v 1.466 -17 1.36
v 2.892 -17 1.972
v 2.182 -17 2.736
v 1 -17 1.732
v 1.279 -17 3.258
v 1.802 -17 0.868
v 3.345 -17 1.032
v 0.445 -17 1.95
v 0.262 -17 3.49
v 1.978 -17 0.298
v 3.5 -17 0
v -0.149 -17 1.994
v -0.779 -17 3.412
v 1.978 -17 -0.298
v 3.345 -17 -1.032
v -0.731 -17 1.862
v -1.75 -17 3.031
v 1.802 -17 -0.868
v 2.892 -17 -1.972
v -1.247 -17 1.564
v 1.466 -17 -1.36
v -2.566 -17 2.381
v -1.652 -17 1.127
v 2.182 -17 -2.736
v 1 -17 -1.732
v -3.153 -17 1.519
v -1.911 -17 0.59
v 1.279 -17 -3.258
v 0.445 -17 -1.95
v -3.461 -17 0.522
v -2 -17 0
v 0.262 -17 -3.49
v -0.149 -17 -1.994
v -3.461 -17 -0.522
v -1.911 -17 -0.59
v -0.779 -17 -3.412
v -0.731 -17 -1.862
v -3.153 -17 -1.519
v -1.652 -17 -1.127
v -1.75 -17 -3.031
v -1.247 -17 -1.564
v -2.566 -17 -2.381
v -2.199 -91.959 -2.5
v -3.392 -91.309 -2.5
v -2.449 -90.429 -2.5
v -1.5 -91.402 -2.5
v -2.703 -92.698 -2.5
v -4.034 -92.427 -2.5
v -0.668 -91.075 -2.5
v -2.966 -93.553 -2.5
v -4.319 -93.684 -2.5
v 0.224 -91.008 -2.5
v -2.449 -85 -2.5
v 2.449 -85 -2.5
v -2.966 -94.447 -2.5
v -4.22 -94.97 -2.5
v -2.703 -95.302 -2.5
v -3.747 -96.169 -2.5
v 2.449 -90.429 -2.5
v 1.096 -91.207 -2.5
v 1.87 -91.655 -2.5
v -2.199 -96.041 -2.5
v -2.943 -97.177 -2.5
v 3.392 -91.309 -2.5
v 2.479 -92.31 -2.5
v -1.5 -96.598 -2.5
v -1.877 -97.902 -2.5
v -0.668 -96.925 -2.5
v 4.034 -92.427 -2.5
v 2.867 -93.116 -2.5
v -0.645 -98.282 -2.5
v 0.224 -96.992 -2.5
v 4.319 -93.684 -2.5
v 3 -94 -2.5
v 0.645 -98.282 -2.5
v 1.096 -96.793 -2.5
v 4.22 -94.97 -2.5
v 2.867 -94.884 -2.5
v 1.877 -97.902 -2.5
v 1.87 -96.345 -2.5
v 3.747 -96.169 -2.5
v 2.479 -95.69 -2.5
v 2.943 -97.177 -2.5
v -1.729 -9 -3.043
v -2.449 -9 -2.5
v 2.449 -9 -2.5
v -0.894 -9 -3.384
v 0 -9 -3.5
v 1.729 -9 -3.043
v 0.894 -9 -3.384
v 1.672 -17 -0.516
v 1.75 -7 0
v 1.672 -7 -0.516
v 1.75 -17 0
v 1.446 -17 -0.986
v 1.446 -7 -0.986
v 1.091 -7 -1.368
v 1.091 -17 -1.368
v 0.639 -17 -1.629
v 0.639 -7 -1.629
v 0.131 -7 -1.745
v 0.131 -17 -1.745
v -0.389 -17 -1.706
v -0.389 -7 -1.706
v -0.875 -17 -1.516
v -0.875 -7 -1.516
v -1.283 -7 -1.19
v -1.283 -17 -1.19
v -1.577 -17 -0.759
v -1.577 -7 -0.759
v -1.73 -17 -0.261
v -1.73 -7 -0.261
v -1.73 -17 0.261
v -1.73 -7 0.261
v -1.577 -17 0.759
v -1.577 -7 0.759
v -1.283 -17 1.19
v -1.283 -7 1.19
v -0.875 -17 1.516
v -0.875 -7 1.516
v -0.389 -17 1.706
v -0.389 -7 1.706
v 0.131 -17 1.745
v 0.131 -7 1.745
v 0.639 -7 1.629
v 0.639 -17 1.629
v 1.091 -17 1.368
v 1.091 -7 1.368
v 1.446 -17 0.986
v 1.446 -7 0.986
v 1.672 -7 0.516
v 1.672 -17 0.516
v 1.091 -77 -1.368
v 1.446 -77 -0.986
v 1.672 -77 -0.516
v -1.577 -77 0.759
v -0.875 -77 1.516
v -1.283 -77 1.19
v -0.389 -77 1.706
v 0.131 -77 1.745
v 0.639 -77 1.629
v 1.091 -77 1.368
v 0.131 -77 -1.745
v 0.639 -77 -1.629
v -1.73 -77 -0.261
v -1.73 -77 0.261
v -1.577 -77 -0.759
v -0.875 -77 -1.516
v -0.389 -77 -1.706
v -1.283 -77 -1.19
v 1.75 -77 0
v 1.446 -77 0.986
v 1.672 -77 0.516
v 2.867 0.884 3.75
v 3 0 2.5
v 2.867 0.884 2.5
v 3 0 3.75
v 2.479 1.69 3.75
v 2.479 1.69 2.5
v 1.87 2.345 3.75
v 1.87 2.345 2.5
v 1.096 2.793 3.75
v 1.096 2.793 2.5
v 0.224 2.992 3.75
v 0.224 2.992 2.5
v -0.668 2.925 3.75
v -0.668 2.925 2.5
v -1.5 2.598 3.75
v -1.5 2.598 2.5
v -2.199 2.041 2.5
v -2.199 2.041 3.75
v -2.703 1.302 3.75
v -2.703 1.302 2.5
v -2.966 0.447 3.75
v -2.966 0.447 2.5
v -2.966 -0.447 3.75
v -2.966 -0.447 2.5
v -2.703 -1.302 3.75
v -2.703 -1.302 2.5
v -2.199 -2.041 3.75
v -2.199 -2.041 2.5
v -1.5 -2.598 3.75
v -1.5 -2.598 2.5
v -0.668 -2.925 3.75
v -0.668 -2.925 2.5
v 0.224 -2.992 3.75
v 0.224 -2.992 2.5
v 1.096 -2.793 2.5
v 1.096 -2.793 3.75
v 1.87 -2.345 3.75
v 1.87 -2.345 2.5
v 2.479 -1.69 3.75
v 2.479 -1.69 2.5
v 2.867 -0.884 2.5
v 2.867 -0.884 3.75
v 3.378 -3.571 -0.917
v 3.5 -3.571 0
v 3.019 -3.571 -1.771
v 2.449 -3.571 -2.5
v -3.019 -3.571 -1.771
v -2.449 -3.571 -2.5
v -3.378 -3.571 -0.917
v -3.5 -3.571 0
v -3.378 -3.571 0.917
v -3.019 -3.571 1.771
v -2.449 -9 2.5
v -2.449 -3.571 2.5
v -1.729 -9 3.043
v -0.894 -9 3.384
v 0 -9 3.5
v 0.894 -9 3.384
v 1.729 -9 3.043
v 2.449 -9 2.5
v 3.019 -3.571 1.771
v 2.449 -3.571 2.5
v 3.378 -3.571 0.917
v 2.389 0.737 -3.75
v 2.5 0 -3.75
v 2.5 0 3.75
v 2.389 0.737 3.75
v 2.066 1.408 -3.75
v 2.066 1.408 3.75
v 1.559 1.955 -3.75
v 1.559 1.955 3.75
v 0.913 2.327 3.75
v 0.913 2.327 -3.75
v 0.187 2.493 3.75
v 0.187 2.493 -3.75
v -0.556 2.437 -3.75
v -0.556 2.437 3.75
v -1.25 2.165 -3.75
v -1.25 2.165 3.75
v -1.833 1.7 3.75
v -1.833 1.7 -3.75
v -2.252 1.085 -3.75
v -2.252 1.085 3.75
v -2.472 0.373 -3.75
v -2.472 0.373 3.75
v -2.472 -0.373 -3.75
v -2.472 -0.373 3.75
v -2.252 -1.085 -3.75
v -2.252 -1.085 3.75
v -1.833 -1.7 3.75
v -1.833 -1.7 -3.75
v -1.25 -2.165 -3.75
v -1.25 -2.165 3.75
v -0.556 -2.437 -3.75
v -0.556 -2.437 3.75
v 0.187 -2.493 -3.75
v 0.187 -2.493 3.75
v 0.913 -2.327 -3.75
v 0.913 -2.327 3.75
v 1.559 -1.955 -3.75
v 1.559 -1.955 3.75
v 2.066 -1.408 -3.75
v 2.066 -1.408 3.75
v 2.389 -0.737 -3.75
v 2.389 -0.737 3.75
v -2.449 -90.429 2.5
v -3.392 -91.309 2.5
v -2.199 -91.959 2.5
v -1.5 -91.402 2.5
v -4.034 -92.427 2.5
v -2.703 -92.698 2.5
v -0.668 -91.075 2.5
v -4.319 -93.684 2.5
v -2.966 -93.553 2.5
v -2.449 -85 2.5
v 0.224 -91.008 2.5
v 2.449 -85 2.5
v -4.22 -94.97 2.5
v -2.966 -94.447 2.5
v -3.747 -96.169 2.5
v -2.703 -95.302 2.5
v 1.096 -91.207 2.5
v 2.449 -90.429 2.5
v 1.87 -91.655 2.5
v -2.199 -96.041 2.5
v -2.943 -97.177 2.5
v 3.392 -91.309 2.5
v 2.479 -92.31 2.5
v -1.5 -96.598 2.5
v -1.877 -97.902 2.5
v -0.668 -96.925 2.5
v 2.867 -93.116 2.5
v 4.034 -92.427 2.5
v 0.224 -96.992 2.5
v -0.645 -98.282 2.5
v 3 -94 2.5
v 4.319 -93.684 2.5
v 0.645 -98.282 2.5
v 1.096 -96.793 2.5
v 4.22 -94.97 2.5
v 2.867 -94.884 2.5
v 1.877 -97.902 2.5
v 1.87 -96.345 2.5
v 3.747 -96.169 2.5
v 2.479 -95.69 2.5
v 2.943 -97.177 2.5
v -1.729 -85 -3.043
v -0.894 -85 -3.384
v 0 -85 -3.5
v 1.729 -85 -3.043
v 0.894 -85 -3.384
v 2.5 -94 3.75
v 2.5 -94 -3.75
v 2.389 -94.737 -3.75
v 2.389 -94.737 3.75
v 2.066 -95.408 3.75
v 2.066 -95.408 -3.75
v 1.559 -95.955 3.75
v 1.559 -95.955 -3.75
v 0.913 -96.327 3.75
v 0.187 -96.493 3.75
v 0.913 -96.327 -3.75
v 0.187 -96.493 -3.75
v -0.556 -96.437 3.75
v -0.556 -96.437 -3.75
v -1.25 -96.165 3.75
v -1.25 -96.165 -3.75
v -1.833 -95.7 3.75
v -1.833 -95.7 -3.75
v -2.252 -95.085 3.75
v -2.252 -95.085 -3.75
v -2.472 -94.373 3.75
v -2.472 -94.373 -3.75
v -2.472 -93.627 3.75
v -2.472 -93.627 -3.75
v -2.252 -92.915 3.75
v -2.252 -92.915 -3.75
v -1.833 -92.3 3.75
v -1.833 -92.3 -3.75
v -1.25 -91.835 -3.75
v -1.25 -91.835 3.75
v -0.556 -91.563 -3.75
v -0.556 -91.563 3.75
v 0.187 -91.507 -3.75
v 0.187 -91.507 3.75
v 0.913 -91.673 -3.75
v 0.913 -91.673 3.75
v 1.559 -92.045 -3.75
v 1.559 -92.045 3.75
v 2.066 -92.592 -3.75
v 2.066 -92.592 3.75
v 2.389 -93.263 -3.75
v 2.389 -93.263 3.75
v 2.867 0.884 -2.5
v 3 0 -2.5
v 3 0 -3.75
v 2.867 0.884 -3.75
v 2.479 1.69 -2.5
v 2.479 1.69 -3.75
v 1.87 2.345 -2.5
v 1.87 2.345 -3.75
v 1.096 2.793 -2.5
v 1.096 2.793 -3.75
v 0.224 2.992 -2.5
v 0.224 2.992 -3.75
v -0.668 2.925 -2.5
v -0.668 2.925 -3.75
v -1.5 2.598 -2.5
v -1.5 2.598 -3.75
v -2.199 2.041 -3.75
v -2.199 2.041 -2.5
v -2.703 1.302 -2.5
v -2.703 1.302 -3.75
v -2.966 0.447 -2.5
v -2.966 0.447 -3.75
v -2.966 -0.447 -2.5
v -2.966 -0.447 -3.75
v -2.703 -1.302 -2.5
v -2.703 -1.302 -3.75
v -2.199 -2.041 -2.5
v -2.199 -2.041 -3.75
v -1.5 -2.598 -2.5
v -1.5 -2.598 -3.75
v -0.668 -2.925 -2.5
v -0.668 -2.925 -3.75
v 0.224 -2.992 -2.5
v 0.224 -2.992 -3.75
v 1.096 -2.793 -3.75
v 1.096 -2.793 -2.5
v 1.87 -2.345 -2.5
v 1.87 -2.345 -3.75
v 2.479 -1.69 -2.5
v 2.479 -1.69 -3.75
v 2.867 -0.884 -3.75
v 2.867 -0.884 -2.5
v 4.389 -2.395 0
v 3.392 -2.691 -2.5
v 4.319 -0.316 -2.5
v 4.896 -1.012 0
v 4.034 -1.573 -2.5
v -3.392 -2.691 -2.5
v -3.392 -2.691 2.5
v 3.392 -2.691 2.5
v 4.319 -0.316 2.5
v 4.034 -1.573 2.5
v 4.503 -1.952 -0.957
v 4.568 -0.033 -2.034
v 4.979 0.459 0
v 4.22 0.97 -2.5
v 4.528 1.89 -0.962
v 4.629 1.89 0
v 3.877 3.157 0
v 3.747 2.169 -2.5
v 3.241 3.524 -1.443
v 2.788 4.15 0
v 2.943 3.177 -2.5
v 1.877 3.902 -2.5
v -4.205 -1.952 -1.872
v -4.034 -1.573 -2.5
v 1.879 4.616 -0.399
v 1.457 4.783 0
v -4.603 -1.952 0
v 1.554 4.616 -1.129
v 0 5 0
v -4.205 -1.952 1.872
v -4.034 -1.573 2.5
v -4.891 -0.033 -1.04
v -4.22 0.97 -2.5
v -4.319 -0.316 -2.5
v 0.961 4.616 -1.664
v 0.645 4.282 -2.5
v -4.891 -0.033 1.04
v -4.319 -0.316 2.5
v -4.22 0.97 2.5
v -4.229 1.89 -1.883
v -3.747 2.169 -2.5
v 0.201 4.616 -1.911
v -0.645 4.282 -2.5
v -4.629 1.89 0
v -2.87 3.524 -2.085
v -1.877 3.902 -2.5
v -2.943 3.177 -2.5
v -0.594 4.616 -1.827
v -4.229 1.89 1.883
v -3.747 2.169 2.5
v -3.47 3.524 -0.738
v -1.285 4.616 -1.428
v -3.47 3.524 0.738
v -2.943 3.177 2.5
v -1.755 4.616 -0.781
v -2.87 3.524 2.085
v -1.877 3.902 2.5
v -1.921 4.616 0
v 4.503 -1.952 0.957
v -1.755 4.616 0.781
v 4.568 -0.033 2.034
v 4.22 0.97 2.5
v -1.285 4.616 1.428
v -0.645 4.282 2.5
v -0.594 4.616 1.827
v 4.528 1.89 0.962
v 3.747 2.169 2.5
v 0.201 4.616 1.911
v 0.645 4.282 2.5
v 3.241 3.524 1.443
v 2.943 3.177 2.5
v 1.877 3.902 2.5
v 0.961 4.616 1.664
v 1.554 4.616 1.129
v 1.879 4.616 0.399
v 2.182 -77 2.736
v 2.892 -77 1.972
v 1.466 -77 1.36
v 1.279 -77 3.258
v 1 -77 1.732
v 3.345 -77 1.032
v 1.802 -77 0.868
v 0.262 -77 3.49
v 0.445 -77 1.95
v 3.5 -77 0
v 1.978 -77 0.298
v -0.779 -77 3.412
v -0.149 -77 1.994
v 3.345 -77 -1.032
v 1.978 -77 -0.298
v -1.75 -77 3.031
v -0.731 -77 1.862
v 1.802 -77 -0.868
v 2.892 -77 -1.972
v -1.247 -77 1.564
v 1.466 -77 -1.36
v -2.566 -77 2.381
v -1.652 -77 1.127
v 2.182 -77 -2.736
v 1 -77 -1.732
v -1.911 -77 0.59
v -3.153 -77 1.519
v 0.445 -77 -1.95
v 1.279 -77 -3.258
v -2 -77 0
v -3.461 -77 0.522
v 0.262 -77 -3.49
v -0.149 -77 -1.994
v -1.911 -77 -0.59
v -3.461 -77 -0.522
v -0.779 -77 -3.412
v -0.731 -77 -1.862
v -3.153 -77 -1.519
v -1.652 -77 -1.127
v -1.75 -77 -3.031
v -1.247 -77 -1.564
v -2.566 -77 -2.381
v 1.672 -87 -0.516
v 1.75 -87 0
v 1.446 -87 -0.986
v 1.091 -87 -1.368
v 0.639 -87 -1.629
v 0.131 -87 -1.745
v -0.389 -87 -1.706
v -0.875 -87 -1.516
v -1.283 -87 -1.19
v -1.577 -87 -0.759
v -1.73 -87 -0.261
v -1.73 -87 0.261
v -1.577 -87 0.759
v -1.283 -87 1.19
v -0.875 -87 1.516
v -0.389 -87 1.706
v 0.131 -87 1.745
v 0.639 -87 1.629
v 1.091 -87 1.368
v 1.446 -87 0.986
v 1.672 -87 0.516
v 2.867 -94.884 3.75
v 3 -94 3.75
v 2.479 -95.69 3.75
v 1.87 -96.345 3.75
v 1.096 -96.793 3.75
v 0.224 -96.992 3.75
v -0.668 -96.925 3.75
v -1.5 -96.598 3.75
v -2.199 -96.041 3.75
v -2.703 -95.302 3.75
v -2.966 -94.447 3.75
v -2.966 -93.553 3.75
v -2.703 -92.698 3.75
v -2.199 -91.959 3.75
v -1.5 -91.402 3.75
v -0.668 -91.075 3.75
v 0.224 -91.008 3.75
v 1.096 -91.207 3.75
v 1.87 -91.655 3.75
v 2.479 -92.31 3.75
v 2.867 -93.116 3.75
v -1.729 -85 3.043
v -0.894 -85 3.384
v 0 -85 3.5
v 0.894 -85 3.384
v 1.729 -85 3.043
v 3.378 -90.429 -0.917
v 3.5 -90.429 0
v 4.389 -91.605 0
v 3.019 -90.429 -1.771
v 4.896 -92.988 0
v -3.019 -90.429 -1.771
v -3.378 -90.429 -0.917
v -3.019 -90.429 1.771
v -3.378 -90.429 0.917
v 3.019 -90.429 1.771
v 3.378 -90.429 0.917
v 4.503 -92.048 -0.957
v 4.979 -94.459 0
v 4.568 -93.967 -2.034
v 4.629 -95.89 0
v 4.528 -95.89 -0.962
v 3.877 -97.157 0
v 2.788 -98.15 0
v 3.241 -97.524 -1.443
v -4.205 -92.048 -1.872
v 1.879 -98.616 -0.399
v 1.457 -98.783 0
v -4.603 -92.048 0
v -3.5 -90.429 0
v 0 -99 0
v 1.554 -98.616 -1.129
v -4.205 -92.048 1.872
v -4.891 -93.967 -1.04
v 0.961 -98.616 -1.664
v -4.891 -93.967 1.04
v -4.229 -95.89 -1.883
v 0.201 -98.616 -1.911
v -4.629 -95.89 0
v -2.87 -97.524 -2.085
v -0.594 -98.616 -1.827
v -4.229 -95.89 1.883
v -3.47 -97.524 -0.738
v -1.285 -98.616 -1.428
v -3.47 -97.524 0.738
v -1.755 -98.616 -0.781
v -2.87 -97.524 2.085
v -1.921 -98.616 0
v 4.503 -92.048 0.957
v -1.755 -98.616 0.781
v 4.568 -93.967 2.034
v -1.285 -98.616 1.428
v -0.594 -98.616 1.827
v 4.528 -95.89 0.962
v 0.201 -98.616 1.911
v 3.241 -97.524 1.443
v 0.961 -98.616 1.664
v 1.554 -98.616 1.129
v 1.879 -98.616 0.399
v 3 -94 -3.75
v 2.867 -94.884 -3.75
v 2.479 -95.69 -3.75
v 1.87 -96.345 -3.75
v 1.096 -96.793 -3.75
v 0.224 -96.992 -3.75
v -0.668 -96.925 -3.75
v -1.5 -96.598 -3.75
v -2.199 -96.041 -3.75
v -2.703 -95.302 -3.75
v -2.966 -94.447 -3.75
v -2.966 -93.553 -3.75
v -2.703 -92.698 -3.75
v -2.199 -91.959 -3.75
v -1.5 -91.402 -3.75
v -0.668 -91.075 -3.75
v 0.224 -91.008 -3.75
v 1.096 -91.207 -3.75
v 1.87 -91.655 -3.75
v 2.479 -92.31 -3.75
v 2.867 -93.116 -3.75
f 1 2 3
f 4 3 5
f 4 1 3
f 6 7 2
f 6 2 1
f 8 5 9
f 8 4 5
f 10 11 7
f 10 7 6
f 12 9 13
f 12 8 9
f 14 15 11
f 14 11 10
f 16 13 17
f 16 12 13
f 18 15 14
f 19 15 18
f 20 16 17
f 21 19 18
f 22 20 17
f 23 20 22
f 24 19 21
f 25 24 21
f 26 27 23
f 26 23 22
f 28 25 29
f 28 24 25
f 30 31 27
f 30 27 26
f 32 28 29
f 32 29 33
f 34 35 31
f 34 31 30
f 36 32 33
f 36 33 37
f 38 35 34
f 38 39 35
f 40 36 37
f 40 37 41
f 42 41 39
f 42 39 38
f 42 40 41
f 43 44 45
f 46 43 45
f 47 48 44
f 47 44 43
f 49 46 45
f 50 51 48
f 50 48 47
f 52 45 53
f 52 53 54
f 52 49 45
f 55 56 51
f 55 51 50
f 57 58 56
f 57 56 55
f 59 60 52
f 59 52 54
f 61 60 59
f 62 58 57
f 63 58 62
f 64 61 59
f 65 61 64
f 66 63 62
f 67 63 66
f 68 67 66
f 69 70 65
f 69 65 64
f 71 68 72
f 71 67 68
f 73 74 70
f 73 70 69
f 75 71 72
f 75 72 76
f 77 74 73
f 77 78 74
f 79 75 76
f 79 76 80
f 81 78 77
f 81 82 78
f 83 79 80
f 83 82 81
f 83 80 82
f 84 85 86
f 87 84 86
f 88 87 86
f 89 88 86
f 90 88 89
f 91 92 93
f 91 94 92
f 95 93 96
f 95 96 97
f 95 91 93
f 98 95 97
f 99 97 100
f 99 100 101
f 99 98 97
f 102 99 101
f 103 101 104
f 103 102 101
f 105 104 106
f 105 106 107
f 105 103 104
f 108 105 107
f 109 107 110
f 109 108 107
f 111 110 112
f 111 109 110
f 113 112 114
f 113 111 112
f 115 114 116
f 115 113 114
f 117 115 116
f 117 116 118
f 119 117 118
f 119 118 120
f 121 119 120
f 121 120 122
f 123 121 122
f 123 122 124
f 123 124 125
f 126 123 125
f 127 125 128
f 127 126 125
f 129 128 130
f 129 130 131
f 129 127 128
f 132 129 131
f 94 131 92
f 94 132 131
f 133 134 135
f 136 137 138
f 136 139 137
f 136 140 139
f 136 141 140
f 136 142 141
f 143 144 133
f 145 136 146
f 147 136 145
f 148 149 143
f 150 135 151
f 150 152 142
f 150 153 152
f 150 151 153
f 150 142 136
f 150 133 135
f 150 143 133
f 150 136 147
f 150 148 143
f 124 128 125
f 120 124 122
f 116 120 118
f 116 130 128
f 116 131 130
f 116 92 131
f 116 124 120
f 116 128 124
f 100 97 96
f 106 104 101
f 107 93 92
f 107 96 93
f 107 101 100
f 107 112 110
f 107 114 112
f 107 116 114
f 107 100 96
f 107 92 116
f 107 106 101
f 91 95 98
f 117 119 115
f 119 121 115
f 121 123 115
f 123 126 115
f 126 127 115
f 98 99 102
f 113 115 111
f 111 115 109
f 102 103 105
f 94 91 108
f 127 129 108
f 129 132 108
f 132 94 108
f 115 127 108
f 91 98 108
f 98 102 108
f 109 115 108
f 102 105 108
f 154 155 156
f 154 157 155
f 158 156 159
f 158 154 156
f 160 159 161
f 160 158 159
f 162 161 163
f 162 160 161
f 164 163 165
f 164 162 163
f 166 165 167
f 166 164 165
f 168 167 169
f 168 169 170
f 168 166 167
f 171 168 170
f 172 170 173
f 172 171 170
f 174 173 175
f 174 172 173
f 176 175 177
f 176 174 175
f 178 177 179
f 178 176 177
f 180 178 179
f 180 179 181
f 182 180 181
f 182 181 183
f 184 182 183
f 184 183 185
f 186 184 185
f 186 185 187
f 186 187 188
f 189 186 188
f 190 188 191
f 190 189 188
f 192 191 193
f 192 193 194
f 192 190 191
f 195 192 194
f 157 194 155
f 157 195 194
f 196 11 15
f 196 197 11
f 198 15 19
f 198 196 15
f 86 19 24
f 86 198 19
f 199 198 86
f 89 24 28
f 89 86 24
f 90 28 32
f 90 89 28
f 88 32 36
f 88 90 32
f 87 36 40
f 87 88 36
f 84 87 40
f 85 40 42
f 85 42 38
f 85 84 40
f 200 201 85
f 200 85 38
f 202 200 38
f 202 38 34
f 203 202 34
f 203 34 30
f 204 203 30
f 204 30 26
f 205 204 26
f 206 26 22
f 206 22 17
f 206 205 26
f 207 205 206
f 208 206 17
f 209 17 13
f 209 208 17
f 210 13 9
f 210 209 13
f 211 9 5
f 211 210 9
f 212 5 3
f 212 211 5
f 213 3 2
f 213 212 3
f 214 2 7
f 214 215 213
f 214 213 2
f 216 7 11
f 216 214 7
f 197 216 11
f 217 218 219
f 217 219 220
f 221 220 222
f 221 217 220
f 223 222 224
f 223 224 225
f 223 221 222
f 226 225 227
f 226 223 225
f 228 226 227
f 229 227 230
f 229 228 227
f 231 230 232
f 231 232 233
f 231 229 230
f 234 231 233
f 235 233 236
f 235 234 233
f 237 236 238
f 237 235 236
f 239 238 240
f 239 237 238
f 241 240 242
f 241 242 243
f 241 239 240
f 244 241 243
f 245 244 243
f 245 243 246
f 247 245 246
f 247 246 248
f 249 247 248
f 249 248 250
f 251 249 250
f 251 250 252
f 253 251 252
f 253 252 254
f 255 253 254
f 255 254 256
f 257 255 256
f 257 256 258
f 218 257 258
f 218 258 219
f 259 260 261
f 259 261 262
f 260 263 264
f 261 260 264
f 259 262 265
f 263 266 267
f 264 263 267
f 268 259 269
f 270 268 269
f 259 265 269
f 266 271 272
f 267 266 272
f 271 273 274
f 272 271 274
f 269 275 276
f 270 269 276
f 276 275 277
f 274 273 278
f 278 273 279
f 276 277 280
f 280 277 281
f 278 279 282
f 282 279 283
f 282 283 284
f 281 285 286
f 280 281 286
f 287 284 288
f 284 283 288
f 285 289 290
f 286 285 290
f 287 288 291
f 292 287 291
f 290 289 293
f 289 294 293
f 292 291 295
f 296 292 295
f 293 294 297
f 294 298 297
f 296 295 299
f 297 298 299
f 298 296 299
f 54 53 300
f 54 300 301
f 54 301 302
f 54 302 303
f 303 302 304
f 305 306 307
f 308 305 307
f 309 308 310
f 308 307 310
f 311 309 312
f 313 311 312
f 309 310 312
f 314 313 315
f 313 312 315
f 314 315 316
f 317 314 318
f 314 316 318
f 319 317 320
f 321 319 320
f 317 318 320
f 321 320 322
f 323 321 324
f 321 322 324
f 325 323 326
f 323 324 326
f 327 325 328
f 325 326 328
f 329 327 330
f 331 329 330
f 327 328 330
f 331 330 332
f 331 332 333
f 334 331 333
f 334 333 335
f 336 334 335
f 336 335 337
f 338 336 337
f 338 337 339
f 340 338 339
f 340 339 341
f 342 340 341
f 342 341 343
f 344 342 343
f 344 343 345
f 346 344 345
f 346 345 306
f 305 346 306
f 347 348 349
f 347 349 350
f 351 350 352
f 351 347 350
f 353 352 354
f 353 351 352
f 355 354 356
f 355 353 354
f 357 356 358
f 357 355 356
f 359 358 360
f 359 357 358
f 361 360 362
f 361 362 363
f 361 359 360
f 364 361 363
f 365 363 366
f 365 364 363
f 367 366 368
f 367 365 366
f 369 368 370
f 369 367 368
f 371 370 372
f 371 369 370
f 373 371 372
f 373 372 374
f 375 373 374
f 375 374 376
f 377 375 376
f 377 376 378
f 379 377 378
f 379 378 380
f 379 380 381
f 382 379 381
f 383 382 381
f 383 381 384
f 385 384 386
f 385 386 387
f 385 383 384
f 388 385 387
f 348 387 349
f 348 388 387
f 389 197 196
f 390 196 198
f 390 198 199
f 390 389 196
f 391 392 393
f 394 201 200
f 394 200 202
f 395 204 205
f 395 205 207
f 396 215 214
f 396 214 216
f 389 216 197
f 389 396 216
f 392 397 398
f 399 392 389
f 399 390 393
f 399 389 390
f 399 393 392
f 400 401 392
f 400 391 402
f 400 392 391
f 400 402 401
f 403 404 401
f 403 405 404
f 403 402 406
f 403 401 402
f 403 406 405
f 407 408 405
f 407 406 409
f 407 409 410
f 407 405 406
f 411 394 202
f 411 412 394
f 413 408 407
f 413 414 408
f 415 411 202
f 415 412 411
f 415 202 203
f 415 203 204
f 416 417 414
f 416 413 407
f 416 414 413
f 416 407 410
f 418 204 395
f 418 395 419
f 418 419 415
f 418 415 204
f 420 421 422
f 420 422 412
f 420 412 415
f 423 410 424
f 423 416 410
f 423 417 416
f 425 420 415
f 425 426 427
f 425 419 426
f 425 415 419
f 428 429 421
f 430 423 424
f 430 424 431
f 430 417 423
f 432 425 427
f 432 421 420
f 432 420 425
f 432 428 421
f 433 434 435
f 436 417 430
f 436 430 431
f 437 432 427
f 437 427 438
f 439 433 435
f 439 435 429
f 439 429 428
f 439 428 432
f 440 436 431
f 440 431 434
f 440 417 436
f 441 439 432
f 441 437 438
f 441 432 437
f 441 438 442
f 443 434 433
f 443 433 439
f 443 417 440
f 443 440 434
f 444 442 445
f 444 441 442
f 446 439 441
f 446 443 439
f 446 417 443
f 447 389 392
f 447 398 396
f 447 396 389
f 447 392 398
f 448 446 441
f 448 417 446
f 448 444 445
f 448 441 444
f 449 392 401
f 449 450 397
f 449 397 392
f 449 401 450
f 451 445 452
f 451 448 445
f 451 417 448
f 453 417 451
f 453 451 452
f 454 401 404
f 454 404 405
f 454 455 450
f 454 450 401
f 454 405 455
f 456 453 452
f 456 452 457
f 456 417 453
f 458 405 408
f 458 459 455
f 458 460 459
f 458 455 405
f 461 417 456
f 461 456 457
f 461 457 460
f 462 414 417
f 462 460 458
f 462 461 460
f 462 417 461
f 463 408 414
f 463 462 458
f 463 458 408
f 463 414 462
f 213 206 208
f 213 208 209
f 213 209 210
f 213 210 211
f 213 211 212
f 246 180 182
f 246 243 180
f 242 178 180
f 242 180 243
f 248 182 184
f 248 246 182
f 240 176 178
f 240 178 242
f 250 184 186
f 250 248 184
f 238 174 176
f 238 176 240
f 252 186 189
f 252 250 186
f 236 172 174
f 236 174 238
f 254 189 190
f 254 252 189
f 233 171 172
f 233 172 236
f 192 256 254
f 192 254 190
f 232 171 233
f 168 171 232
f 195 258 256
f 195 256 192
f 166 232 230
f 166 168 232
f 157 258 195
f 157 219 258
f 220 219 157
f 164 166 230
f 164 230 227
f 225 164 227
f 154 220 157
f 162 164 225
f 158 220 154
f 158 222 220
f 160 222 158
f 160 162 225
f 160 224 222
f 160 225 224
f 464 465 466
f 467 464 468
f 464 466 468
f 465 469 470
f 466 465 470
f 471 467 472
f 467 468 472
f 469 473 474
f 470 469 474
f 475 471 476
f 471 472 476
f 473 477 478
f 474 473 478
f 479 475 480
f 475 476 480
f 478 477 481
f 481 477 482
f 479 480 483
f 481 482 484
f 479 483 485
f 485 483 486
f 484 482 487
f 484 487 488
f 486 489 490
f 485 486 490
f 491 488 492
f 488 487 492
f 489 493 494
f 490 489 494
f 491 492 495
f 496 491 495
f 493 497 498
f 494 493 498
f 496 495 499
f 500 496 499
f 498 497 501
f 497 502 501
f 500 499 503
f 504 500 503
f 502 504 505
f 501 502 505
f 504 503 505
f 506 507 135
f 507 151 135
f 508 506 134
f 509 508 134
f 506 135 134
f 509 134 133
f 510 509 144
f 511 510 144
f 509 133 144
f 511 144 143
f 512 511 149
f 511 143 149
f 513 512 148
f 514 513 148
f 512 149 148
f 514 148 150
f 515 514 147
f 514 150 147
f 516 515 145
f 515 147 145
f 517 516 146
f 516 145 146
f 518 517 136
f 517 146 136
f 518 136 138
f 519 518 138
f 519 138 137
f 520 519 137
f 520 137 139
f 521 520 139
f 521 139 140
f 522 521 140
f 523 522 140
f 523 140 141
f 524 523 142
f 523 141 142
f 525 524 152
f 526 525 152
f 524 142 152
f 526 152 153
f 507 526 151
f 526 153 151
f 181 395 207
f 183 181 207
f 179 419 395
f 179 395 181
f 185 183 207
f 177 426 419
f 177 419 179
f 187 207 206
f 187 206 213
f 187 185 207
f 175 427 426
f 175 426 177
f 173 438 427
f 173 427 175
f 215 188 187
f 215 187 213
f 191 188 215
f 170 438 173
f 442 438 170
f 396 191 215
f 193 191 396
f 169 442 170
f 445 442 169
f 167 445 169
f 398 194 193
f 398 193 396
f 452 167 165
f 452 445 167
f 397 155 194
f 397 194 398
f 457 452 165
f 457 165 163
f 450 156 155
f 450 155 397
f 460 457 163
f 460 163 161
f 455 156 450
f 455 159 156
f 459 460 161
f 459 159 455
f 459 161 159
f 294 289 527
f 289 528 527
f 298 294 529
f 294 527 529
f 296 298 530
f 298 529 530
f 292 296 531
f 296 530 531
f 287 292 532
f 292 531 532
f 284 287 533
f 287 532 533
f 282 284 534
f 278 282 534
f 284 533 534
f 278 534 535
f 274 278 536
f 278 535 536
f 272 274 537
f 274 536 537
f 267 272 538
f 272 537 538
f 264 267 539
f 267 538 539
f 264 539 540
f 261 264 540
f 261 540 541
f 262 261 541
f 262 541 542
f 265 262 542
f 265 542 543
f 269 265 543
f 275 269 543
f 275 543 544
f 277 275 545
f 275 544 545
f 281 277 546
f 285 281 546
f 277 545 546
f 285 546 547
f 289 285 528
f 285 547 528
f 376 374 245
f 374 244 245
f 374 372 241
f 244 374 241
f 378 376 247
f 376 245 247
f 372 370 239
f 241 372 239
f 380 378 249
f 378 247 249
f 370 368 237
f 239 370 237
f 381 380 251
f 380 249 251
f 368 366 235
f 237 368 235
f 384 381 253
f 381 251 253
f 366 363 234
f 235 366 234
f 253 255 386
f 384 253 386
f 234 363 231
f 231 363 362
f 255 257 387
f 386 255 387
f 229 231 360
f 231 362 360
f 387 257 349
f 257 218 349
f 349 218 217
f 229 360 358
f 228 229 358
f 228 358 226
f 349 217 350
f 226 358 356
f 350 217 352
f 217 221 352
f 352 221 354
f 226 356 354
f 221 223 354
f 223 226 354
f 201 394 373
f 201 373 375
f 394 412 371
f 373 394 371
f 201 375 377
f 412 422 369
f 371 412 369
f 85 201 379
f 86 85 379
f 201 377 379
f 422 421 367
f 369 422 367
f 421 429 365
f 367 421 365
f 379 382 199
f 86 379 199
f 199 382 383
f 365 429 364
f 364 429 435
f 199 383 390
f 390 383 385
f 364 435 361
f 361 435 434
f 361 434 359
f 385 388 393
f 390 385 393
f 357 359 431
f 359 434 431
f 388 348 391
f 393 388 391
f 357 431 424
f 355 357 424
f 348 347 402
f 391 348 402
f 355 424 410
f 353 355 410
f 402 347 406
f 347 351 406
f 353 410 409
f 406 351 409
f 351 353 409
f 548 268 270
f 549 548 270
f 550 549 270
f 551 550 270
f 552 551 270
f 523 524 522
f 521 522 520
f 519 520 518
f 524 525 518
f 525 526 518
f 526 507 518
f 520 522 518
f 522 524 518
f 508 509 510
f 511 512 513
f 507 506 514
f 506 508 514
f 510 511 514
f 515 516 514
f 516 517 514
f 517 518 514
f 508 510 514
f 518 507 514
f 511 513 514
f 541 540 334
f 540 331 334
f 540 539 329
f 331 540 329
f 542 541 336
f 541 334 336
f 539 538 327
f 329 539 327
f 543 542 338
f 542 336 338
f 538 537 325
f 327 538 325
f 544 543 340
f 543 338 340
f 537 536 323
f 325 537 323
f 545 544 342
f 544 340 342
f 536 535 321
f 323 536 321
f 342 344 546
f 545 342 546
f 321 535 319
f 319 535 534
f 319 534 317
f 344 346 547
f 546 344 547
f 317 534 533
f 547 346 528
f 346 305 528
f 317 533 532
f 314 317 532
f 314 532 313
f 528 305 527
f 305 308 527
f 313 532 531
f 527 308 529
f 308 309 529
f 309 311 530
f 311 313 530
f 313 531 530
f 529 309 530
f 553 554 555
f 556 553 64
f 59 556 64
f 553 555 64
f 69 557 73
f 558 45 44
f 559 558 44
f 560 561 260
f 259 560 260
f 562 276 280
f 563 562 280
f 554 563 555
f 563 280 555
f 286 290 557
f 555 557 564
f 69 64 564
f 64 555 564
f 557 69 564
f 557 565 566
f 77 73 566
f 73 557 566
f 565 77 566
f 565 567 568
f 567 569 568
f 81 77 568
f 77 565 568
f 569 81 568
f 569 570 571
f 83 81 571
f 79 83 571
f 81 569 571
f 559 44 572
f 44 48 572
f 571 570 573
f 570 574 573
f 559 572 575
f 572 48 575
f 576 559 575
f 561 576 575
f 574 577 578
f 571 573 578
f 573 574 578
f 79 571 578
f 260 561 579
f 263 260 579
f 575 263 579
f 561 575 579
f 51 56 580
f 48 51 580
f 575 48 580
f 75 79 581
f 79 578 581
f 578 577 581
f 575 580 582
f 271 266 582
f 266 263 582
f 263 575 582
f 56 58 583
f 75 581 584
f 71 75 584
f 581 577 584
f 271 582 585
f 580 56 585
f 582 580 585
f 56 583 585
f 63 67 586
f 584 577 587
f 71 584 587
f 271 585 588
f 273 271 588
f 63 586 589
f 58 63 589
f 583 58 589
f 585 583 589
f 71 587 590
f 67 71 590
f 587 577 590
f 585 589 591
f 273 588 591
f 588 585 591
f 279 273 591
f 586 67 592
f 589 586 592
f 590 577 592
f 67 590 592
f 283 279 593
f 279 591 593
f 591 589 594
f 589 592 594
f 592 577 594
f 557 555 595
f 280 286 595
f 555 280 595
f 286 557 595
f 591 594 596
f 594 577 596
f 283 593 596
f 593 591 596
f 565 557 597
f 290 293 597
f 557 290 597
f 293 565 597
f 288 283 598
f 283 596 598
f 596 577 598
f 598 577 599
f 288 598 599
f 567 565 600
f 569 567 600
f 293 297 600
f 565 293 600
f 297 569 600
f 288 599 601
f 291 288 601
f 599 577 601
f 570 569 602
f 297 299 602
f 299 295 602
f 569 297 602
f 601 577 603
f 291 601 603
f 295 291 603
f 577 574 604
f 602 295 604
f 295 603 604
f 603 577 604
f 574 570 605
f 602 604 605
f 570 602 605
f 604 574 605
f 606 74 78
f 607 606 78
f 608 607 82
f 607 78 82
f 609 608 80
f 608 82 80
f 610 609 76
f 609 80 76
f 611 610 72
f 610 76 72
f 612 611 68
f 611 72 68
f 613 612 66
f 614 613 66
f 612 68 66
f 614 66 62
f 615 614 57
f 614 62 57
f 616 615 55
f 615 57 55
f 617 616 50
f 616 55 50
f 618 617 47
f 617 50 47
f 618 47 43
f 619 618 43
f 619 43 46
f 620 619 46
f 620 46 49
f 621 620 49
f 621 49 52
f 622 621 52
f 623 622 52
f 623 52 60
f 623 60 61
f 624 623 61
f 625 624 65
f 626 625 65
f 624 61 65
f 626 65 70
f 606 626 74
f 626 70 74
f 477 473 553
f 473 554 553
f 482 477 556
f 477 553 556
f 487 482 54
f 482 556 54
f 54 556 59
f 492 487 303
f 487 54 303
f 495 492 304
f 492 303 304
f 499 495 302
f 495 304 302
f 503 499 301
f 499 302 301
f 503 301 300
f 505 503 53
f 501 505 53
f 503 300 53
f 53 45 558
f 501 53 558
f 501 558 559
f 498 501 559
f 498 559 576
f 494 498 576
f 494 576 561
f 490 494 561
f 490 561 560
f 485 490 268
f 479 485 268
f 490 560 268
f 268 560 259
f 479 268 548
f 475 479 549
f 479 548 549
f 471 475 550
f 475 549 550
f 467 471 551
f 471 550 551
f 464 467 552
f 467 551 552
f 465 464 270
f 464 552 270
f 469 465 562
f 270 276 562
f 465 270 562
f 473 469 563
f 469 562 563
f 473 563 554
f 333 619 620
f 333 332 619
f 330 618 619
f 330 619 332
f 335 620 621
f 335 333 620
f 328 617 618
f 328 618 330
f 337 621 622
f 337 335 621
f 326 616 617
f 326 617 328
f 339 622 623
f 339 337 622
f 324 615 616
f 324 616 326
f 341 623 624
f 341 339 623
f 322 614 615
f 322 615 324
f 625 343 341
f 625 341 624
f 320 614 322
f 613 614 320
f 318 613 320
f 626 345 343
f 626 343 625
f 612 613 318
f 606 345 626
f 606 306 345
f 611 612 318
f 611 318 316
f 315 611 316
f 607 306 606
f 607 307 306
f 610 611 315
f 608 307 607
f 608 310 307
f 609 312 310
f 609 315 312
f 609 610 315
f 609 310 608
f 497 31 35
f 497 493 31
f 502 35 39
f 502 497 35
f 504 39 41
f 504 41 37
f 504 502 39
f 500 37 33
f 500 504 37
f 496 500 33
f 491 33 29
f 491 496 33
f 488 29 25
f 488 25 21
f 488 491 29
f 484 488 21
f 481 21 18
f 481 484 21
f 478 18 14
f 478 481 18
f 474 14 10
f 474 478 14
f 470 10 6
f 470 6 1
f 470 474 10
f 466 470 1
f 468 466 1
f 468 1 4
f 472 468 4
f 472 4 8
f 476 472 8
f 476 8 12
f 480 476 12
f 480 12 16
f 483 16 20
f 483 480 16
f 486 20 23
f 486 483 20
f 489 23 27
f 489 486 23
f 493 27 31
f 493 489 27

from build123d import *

# Parameters (mm, degrees)
SKETCH2_R               = 2.5
CUT_EXTRUDE1_DEPTH      = 6
CUT_EXTRUDE1_DEPTH_BACK = 6
SKETCH4_W               = 12
SKETCH4_H               = 18
CUT_EXTRUDE2_DEPTH      = 1.830127
SKETCH3_R               = 3
SKETCH3_R_2             = 2.5
EXTRUDE_THIN1_DEPTH     = 3.75
SKETCH5_R               = 2
BOSS_EXTRUDE1_DEPTH     = 30


with BuildPart() as part:
    # Sketch1 → Revolve1 (revolve)
    with BuildSketch(Plane.XY):
        with BuildLine():
            Line((0, 0), (0, -7))
            Line((0, -7), (1.75, -7))
            Line((1.75, -7), (1.75, -17))
            Line((1.75, -17), (3.5, -17))
            Line((3.5, -17), (3.5, -3.570714214))
            ThreePointArc((3.5, -3.570714214), (4.628907596, 1.890294809), (0, 5))
            Line((0, 5), (0, 0))
        make_face()
    revolve(axis=Axis((0, 0, 0), (0, 1, 0)))

    # Sketch2 → Cut-Extrude1 (cut, two sides)
    with BuildSketch(Plane.XY) as cut_extrude1_sk:
        Circle(SKETCH2_R)
    extrude(amount=CUT_EXTRUDE1_DEPTH, mode=Mode.SUBTRACT)
    extrude(cut_extrude1_sk.sketch, amount=-CUT_EXTRUDE1_DEPTH_BACK, mode=Mode.SUBTRACT)

    # Sketch4 → Cut-Extrude2 (cut)
    with BuildSketch(Plane.XY.offset(2.5)):
        Rectangle(SKETCH4_W, SKETCH4_H)
    cut_extrude2 = extrude(amount=CUT_EXTRUDE2_DEPTH, mode=Mode.SUBTRACT)

    # Mirror1: Cut-Extrude2 across plane
    add(cut_extrude2.mirror(Plane.XY), mode=Mode.SUBTRACT)

    # Sketch3 → Extrude-Thin1 (add, symmetric)
    with BuildSketch(Plane.XY):
        Circle(SKETCH3_R)
        Circle(SKETCH3_R_2, mode=Mode.SUBTRACT)
    extrude(amount=EXTRUDE_THIN1_DEPTH, both=True)


with BuildPart() as body_2:
    # Mirror3: mirrored copy
    add(part.part.mirror(Plane(origin=(0, -47, 0), x_dir=(0, 0, 1), z_dir=(0, -1, 0))))


with BuildPart() as part_1:
    add(part.part)

    add(body_2.part)  # Boss-Extrude1 merges body 2
    # Sketch5 → Boss-Extrude1 (add, symmetric)
    with BuildSketch(Plane(origin=(0, -47, 0), x_dir=(-1, 0, 0), z_dir=(0, -1, 0))):
        Circle(SKETCH5_R)
    extrude(amount=BOSS_EXTRUDE1_DEPTH, both=True)


solid = part_1.part
